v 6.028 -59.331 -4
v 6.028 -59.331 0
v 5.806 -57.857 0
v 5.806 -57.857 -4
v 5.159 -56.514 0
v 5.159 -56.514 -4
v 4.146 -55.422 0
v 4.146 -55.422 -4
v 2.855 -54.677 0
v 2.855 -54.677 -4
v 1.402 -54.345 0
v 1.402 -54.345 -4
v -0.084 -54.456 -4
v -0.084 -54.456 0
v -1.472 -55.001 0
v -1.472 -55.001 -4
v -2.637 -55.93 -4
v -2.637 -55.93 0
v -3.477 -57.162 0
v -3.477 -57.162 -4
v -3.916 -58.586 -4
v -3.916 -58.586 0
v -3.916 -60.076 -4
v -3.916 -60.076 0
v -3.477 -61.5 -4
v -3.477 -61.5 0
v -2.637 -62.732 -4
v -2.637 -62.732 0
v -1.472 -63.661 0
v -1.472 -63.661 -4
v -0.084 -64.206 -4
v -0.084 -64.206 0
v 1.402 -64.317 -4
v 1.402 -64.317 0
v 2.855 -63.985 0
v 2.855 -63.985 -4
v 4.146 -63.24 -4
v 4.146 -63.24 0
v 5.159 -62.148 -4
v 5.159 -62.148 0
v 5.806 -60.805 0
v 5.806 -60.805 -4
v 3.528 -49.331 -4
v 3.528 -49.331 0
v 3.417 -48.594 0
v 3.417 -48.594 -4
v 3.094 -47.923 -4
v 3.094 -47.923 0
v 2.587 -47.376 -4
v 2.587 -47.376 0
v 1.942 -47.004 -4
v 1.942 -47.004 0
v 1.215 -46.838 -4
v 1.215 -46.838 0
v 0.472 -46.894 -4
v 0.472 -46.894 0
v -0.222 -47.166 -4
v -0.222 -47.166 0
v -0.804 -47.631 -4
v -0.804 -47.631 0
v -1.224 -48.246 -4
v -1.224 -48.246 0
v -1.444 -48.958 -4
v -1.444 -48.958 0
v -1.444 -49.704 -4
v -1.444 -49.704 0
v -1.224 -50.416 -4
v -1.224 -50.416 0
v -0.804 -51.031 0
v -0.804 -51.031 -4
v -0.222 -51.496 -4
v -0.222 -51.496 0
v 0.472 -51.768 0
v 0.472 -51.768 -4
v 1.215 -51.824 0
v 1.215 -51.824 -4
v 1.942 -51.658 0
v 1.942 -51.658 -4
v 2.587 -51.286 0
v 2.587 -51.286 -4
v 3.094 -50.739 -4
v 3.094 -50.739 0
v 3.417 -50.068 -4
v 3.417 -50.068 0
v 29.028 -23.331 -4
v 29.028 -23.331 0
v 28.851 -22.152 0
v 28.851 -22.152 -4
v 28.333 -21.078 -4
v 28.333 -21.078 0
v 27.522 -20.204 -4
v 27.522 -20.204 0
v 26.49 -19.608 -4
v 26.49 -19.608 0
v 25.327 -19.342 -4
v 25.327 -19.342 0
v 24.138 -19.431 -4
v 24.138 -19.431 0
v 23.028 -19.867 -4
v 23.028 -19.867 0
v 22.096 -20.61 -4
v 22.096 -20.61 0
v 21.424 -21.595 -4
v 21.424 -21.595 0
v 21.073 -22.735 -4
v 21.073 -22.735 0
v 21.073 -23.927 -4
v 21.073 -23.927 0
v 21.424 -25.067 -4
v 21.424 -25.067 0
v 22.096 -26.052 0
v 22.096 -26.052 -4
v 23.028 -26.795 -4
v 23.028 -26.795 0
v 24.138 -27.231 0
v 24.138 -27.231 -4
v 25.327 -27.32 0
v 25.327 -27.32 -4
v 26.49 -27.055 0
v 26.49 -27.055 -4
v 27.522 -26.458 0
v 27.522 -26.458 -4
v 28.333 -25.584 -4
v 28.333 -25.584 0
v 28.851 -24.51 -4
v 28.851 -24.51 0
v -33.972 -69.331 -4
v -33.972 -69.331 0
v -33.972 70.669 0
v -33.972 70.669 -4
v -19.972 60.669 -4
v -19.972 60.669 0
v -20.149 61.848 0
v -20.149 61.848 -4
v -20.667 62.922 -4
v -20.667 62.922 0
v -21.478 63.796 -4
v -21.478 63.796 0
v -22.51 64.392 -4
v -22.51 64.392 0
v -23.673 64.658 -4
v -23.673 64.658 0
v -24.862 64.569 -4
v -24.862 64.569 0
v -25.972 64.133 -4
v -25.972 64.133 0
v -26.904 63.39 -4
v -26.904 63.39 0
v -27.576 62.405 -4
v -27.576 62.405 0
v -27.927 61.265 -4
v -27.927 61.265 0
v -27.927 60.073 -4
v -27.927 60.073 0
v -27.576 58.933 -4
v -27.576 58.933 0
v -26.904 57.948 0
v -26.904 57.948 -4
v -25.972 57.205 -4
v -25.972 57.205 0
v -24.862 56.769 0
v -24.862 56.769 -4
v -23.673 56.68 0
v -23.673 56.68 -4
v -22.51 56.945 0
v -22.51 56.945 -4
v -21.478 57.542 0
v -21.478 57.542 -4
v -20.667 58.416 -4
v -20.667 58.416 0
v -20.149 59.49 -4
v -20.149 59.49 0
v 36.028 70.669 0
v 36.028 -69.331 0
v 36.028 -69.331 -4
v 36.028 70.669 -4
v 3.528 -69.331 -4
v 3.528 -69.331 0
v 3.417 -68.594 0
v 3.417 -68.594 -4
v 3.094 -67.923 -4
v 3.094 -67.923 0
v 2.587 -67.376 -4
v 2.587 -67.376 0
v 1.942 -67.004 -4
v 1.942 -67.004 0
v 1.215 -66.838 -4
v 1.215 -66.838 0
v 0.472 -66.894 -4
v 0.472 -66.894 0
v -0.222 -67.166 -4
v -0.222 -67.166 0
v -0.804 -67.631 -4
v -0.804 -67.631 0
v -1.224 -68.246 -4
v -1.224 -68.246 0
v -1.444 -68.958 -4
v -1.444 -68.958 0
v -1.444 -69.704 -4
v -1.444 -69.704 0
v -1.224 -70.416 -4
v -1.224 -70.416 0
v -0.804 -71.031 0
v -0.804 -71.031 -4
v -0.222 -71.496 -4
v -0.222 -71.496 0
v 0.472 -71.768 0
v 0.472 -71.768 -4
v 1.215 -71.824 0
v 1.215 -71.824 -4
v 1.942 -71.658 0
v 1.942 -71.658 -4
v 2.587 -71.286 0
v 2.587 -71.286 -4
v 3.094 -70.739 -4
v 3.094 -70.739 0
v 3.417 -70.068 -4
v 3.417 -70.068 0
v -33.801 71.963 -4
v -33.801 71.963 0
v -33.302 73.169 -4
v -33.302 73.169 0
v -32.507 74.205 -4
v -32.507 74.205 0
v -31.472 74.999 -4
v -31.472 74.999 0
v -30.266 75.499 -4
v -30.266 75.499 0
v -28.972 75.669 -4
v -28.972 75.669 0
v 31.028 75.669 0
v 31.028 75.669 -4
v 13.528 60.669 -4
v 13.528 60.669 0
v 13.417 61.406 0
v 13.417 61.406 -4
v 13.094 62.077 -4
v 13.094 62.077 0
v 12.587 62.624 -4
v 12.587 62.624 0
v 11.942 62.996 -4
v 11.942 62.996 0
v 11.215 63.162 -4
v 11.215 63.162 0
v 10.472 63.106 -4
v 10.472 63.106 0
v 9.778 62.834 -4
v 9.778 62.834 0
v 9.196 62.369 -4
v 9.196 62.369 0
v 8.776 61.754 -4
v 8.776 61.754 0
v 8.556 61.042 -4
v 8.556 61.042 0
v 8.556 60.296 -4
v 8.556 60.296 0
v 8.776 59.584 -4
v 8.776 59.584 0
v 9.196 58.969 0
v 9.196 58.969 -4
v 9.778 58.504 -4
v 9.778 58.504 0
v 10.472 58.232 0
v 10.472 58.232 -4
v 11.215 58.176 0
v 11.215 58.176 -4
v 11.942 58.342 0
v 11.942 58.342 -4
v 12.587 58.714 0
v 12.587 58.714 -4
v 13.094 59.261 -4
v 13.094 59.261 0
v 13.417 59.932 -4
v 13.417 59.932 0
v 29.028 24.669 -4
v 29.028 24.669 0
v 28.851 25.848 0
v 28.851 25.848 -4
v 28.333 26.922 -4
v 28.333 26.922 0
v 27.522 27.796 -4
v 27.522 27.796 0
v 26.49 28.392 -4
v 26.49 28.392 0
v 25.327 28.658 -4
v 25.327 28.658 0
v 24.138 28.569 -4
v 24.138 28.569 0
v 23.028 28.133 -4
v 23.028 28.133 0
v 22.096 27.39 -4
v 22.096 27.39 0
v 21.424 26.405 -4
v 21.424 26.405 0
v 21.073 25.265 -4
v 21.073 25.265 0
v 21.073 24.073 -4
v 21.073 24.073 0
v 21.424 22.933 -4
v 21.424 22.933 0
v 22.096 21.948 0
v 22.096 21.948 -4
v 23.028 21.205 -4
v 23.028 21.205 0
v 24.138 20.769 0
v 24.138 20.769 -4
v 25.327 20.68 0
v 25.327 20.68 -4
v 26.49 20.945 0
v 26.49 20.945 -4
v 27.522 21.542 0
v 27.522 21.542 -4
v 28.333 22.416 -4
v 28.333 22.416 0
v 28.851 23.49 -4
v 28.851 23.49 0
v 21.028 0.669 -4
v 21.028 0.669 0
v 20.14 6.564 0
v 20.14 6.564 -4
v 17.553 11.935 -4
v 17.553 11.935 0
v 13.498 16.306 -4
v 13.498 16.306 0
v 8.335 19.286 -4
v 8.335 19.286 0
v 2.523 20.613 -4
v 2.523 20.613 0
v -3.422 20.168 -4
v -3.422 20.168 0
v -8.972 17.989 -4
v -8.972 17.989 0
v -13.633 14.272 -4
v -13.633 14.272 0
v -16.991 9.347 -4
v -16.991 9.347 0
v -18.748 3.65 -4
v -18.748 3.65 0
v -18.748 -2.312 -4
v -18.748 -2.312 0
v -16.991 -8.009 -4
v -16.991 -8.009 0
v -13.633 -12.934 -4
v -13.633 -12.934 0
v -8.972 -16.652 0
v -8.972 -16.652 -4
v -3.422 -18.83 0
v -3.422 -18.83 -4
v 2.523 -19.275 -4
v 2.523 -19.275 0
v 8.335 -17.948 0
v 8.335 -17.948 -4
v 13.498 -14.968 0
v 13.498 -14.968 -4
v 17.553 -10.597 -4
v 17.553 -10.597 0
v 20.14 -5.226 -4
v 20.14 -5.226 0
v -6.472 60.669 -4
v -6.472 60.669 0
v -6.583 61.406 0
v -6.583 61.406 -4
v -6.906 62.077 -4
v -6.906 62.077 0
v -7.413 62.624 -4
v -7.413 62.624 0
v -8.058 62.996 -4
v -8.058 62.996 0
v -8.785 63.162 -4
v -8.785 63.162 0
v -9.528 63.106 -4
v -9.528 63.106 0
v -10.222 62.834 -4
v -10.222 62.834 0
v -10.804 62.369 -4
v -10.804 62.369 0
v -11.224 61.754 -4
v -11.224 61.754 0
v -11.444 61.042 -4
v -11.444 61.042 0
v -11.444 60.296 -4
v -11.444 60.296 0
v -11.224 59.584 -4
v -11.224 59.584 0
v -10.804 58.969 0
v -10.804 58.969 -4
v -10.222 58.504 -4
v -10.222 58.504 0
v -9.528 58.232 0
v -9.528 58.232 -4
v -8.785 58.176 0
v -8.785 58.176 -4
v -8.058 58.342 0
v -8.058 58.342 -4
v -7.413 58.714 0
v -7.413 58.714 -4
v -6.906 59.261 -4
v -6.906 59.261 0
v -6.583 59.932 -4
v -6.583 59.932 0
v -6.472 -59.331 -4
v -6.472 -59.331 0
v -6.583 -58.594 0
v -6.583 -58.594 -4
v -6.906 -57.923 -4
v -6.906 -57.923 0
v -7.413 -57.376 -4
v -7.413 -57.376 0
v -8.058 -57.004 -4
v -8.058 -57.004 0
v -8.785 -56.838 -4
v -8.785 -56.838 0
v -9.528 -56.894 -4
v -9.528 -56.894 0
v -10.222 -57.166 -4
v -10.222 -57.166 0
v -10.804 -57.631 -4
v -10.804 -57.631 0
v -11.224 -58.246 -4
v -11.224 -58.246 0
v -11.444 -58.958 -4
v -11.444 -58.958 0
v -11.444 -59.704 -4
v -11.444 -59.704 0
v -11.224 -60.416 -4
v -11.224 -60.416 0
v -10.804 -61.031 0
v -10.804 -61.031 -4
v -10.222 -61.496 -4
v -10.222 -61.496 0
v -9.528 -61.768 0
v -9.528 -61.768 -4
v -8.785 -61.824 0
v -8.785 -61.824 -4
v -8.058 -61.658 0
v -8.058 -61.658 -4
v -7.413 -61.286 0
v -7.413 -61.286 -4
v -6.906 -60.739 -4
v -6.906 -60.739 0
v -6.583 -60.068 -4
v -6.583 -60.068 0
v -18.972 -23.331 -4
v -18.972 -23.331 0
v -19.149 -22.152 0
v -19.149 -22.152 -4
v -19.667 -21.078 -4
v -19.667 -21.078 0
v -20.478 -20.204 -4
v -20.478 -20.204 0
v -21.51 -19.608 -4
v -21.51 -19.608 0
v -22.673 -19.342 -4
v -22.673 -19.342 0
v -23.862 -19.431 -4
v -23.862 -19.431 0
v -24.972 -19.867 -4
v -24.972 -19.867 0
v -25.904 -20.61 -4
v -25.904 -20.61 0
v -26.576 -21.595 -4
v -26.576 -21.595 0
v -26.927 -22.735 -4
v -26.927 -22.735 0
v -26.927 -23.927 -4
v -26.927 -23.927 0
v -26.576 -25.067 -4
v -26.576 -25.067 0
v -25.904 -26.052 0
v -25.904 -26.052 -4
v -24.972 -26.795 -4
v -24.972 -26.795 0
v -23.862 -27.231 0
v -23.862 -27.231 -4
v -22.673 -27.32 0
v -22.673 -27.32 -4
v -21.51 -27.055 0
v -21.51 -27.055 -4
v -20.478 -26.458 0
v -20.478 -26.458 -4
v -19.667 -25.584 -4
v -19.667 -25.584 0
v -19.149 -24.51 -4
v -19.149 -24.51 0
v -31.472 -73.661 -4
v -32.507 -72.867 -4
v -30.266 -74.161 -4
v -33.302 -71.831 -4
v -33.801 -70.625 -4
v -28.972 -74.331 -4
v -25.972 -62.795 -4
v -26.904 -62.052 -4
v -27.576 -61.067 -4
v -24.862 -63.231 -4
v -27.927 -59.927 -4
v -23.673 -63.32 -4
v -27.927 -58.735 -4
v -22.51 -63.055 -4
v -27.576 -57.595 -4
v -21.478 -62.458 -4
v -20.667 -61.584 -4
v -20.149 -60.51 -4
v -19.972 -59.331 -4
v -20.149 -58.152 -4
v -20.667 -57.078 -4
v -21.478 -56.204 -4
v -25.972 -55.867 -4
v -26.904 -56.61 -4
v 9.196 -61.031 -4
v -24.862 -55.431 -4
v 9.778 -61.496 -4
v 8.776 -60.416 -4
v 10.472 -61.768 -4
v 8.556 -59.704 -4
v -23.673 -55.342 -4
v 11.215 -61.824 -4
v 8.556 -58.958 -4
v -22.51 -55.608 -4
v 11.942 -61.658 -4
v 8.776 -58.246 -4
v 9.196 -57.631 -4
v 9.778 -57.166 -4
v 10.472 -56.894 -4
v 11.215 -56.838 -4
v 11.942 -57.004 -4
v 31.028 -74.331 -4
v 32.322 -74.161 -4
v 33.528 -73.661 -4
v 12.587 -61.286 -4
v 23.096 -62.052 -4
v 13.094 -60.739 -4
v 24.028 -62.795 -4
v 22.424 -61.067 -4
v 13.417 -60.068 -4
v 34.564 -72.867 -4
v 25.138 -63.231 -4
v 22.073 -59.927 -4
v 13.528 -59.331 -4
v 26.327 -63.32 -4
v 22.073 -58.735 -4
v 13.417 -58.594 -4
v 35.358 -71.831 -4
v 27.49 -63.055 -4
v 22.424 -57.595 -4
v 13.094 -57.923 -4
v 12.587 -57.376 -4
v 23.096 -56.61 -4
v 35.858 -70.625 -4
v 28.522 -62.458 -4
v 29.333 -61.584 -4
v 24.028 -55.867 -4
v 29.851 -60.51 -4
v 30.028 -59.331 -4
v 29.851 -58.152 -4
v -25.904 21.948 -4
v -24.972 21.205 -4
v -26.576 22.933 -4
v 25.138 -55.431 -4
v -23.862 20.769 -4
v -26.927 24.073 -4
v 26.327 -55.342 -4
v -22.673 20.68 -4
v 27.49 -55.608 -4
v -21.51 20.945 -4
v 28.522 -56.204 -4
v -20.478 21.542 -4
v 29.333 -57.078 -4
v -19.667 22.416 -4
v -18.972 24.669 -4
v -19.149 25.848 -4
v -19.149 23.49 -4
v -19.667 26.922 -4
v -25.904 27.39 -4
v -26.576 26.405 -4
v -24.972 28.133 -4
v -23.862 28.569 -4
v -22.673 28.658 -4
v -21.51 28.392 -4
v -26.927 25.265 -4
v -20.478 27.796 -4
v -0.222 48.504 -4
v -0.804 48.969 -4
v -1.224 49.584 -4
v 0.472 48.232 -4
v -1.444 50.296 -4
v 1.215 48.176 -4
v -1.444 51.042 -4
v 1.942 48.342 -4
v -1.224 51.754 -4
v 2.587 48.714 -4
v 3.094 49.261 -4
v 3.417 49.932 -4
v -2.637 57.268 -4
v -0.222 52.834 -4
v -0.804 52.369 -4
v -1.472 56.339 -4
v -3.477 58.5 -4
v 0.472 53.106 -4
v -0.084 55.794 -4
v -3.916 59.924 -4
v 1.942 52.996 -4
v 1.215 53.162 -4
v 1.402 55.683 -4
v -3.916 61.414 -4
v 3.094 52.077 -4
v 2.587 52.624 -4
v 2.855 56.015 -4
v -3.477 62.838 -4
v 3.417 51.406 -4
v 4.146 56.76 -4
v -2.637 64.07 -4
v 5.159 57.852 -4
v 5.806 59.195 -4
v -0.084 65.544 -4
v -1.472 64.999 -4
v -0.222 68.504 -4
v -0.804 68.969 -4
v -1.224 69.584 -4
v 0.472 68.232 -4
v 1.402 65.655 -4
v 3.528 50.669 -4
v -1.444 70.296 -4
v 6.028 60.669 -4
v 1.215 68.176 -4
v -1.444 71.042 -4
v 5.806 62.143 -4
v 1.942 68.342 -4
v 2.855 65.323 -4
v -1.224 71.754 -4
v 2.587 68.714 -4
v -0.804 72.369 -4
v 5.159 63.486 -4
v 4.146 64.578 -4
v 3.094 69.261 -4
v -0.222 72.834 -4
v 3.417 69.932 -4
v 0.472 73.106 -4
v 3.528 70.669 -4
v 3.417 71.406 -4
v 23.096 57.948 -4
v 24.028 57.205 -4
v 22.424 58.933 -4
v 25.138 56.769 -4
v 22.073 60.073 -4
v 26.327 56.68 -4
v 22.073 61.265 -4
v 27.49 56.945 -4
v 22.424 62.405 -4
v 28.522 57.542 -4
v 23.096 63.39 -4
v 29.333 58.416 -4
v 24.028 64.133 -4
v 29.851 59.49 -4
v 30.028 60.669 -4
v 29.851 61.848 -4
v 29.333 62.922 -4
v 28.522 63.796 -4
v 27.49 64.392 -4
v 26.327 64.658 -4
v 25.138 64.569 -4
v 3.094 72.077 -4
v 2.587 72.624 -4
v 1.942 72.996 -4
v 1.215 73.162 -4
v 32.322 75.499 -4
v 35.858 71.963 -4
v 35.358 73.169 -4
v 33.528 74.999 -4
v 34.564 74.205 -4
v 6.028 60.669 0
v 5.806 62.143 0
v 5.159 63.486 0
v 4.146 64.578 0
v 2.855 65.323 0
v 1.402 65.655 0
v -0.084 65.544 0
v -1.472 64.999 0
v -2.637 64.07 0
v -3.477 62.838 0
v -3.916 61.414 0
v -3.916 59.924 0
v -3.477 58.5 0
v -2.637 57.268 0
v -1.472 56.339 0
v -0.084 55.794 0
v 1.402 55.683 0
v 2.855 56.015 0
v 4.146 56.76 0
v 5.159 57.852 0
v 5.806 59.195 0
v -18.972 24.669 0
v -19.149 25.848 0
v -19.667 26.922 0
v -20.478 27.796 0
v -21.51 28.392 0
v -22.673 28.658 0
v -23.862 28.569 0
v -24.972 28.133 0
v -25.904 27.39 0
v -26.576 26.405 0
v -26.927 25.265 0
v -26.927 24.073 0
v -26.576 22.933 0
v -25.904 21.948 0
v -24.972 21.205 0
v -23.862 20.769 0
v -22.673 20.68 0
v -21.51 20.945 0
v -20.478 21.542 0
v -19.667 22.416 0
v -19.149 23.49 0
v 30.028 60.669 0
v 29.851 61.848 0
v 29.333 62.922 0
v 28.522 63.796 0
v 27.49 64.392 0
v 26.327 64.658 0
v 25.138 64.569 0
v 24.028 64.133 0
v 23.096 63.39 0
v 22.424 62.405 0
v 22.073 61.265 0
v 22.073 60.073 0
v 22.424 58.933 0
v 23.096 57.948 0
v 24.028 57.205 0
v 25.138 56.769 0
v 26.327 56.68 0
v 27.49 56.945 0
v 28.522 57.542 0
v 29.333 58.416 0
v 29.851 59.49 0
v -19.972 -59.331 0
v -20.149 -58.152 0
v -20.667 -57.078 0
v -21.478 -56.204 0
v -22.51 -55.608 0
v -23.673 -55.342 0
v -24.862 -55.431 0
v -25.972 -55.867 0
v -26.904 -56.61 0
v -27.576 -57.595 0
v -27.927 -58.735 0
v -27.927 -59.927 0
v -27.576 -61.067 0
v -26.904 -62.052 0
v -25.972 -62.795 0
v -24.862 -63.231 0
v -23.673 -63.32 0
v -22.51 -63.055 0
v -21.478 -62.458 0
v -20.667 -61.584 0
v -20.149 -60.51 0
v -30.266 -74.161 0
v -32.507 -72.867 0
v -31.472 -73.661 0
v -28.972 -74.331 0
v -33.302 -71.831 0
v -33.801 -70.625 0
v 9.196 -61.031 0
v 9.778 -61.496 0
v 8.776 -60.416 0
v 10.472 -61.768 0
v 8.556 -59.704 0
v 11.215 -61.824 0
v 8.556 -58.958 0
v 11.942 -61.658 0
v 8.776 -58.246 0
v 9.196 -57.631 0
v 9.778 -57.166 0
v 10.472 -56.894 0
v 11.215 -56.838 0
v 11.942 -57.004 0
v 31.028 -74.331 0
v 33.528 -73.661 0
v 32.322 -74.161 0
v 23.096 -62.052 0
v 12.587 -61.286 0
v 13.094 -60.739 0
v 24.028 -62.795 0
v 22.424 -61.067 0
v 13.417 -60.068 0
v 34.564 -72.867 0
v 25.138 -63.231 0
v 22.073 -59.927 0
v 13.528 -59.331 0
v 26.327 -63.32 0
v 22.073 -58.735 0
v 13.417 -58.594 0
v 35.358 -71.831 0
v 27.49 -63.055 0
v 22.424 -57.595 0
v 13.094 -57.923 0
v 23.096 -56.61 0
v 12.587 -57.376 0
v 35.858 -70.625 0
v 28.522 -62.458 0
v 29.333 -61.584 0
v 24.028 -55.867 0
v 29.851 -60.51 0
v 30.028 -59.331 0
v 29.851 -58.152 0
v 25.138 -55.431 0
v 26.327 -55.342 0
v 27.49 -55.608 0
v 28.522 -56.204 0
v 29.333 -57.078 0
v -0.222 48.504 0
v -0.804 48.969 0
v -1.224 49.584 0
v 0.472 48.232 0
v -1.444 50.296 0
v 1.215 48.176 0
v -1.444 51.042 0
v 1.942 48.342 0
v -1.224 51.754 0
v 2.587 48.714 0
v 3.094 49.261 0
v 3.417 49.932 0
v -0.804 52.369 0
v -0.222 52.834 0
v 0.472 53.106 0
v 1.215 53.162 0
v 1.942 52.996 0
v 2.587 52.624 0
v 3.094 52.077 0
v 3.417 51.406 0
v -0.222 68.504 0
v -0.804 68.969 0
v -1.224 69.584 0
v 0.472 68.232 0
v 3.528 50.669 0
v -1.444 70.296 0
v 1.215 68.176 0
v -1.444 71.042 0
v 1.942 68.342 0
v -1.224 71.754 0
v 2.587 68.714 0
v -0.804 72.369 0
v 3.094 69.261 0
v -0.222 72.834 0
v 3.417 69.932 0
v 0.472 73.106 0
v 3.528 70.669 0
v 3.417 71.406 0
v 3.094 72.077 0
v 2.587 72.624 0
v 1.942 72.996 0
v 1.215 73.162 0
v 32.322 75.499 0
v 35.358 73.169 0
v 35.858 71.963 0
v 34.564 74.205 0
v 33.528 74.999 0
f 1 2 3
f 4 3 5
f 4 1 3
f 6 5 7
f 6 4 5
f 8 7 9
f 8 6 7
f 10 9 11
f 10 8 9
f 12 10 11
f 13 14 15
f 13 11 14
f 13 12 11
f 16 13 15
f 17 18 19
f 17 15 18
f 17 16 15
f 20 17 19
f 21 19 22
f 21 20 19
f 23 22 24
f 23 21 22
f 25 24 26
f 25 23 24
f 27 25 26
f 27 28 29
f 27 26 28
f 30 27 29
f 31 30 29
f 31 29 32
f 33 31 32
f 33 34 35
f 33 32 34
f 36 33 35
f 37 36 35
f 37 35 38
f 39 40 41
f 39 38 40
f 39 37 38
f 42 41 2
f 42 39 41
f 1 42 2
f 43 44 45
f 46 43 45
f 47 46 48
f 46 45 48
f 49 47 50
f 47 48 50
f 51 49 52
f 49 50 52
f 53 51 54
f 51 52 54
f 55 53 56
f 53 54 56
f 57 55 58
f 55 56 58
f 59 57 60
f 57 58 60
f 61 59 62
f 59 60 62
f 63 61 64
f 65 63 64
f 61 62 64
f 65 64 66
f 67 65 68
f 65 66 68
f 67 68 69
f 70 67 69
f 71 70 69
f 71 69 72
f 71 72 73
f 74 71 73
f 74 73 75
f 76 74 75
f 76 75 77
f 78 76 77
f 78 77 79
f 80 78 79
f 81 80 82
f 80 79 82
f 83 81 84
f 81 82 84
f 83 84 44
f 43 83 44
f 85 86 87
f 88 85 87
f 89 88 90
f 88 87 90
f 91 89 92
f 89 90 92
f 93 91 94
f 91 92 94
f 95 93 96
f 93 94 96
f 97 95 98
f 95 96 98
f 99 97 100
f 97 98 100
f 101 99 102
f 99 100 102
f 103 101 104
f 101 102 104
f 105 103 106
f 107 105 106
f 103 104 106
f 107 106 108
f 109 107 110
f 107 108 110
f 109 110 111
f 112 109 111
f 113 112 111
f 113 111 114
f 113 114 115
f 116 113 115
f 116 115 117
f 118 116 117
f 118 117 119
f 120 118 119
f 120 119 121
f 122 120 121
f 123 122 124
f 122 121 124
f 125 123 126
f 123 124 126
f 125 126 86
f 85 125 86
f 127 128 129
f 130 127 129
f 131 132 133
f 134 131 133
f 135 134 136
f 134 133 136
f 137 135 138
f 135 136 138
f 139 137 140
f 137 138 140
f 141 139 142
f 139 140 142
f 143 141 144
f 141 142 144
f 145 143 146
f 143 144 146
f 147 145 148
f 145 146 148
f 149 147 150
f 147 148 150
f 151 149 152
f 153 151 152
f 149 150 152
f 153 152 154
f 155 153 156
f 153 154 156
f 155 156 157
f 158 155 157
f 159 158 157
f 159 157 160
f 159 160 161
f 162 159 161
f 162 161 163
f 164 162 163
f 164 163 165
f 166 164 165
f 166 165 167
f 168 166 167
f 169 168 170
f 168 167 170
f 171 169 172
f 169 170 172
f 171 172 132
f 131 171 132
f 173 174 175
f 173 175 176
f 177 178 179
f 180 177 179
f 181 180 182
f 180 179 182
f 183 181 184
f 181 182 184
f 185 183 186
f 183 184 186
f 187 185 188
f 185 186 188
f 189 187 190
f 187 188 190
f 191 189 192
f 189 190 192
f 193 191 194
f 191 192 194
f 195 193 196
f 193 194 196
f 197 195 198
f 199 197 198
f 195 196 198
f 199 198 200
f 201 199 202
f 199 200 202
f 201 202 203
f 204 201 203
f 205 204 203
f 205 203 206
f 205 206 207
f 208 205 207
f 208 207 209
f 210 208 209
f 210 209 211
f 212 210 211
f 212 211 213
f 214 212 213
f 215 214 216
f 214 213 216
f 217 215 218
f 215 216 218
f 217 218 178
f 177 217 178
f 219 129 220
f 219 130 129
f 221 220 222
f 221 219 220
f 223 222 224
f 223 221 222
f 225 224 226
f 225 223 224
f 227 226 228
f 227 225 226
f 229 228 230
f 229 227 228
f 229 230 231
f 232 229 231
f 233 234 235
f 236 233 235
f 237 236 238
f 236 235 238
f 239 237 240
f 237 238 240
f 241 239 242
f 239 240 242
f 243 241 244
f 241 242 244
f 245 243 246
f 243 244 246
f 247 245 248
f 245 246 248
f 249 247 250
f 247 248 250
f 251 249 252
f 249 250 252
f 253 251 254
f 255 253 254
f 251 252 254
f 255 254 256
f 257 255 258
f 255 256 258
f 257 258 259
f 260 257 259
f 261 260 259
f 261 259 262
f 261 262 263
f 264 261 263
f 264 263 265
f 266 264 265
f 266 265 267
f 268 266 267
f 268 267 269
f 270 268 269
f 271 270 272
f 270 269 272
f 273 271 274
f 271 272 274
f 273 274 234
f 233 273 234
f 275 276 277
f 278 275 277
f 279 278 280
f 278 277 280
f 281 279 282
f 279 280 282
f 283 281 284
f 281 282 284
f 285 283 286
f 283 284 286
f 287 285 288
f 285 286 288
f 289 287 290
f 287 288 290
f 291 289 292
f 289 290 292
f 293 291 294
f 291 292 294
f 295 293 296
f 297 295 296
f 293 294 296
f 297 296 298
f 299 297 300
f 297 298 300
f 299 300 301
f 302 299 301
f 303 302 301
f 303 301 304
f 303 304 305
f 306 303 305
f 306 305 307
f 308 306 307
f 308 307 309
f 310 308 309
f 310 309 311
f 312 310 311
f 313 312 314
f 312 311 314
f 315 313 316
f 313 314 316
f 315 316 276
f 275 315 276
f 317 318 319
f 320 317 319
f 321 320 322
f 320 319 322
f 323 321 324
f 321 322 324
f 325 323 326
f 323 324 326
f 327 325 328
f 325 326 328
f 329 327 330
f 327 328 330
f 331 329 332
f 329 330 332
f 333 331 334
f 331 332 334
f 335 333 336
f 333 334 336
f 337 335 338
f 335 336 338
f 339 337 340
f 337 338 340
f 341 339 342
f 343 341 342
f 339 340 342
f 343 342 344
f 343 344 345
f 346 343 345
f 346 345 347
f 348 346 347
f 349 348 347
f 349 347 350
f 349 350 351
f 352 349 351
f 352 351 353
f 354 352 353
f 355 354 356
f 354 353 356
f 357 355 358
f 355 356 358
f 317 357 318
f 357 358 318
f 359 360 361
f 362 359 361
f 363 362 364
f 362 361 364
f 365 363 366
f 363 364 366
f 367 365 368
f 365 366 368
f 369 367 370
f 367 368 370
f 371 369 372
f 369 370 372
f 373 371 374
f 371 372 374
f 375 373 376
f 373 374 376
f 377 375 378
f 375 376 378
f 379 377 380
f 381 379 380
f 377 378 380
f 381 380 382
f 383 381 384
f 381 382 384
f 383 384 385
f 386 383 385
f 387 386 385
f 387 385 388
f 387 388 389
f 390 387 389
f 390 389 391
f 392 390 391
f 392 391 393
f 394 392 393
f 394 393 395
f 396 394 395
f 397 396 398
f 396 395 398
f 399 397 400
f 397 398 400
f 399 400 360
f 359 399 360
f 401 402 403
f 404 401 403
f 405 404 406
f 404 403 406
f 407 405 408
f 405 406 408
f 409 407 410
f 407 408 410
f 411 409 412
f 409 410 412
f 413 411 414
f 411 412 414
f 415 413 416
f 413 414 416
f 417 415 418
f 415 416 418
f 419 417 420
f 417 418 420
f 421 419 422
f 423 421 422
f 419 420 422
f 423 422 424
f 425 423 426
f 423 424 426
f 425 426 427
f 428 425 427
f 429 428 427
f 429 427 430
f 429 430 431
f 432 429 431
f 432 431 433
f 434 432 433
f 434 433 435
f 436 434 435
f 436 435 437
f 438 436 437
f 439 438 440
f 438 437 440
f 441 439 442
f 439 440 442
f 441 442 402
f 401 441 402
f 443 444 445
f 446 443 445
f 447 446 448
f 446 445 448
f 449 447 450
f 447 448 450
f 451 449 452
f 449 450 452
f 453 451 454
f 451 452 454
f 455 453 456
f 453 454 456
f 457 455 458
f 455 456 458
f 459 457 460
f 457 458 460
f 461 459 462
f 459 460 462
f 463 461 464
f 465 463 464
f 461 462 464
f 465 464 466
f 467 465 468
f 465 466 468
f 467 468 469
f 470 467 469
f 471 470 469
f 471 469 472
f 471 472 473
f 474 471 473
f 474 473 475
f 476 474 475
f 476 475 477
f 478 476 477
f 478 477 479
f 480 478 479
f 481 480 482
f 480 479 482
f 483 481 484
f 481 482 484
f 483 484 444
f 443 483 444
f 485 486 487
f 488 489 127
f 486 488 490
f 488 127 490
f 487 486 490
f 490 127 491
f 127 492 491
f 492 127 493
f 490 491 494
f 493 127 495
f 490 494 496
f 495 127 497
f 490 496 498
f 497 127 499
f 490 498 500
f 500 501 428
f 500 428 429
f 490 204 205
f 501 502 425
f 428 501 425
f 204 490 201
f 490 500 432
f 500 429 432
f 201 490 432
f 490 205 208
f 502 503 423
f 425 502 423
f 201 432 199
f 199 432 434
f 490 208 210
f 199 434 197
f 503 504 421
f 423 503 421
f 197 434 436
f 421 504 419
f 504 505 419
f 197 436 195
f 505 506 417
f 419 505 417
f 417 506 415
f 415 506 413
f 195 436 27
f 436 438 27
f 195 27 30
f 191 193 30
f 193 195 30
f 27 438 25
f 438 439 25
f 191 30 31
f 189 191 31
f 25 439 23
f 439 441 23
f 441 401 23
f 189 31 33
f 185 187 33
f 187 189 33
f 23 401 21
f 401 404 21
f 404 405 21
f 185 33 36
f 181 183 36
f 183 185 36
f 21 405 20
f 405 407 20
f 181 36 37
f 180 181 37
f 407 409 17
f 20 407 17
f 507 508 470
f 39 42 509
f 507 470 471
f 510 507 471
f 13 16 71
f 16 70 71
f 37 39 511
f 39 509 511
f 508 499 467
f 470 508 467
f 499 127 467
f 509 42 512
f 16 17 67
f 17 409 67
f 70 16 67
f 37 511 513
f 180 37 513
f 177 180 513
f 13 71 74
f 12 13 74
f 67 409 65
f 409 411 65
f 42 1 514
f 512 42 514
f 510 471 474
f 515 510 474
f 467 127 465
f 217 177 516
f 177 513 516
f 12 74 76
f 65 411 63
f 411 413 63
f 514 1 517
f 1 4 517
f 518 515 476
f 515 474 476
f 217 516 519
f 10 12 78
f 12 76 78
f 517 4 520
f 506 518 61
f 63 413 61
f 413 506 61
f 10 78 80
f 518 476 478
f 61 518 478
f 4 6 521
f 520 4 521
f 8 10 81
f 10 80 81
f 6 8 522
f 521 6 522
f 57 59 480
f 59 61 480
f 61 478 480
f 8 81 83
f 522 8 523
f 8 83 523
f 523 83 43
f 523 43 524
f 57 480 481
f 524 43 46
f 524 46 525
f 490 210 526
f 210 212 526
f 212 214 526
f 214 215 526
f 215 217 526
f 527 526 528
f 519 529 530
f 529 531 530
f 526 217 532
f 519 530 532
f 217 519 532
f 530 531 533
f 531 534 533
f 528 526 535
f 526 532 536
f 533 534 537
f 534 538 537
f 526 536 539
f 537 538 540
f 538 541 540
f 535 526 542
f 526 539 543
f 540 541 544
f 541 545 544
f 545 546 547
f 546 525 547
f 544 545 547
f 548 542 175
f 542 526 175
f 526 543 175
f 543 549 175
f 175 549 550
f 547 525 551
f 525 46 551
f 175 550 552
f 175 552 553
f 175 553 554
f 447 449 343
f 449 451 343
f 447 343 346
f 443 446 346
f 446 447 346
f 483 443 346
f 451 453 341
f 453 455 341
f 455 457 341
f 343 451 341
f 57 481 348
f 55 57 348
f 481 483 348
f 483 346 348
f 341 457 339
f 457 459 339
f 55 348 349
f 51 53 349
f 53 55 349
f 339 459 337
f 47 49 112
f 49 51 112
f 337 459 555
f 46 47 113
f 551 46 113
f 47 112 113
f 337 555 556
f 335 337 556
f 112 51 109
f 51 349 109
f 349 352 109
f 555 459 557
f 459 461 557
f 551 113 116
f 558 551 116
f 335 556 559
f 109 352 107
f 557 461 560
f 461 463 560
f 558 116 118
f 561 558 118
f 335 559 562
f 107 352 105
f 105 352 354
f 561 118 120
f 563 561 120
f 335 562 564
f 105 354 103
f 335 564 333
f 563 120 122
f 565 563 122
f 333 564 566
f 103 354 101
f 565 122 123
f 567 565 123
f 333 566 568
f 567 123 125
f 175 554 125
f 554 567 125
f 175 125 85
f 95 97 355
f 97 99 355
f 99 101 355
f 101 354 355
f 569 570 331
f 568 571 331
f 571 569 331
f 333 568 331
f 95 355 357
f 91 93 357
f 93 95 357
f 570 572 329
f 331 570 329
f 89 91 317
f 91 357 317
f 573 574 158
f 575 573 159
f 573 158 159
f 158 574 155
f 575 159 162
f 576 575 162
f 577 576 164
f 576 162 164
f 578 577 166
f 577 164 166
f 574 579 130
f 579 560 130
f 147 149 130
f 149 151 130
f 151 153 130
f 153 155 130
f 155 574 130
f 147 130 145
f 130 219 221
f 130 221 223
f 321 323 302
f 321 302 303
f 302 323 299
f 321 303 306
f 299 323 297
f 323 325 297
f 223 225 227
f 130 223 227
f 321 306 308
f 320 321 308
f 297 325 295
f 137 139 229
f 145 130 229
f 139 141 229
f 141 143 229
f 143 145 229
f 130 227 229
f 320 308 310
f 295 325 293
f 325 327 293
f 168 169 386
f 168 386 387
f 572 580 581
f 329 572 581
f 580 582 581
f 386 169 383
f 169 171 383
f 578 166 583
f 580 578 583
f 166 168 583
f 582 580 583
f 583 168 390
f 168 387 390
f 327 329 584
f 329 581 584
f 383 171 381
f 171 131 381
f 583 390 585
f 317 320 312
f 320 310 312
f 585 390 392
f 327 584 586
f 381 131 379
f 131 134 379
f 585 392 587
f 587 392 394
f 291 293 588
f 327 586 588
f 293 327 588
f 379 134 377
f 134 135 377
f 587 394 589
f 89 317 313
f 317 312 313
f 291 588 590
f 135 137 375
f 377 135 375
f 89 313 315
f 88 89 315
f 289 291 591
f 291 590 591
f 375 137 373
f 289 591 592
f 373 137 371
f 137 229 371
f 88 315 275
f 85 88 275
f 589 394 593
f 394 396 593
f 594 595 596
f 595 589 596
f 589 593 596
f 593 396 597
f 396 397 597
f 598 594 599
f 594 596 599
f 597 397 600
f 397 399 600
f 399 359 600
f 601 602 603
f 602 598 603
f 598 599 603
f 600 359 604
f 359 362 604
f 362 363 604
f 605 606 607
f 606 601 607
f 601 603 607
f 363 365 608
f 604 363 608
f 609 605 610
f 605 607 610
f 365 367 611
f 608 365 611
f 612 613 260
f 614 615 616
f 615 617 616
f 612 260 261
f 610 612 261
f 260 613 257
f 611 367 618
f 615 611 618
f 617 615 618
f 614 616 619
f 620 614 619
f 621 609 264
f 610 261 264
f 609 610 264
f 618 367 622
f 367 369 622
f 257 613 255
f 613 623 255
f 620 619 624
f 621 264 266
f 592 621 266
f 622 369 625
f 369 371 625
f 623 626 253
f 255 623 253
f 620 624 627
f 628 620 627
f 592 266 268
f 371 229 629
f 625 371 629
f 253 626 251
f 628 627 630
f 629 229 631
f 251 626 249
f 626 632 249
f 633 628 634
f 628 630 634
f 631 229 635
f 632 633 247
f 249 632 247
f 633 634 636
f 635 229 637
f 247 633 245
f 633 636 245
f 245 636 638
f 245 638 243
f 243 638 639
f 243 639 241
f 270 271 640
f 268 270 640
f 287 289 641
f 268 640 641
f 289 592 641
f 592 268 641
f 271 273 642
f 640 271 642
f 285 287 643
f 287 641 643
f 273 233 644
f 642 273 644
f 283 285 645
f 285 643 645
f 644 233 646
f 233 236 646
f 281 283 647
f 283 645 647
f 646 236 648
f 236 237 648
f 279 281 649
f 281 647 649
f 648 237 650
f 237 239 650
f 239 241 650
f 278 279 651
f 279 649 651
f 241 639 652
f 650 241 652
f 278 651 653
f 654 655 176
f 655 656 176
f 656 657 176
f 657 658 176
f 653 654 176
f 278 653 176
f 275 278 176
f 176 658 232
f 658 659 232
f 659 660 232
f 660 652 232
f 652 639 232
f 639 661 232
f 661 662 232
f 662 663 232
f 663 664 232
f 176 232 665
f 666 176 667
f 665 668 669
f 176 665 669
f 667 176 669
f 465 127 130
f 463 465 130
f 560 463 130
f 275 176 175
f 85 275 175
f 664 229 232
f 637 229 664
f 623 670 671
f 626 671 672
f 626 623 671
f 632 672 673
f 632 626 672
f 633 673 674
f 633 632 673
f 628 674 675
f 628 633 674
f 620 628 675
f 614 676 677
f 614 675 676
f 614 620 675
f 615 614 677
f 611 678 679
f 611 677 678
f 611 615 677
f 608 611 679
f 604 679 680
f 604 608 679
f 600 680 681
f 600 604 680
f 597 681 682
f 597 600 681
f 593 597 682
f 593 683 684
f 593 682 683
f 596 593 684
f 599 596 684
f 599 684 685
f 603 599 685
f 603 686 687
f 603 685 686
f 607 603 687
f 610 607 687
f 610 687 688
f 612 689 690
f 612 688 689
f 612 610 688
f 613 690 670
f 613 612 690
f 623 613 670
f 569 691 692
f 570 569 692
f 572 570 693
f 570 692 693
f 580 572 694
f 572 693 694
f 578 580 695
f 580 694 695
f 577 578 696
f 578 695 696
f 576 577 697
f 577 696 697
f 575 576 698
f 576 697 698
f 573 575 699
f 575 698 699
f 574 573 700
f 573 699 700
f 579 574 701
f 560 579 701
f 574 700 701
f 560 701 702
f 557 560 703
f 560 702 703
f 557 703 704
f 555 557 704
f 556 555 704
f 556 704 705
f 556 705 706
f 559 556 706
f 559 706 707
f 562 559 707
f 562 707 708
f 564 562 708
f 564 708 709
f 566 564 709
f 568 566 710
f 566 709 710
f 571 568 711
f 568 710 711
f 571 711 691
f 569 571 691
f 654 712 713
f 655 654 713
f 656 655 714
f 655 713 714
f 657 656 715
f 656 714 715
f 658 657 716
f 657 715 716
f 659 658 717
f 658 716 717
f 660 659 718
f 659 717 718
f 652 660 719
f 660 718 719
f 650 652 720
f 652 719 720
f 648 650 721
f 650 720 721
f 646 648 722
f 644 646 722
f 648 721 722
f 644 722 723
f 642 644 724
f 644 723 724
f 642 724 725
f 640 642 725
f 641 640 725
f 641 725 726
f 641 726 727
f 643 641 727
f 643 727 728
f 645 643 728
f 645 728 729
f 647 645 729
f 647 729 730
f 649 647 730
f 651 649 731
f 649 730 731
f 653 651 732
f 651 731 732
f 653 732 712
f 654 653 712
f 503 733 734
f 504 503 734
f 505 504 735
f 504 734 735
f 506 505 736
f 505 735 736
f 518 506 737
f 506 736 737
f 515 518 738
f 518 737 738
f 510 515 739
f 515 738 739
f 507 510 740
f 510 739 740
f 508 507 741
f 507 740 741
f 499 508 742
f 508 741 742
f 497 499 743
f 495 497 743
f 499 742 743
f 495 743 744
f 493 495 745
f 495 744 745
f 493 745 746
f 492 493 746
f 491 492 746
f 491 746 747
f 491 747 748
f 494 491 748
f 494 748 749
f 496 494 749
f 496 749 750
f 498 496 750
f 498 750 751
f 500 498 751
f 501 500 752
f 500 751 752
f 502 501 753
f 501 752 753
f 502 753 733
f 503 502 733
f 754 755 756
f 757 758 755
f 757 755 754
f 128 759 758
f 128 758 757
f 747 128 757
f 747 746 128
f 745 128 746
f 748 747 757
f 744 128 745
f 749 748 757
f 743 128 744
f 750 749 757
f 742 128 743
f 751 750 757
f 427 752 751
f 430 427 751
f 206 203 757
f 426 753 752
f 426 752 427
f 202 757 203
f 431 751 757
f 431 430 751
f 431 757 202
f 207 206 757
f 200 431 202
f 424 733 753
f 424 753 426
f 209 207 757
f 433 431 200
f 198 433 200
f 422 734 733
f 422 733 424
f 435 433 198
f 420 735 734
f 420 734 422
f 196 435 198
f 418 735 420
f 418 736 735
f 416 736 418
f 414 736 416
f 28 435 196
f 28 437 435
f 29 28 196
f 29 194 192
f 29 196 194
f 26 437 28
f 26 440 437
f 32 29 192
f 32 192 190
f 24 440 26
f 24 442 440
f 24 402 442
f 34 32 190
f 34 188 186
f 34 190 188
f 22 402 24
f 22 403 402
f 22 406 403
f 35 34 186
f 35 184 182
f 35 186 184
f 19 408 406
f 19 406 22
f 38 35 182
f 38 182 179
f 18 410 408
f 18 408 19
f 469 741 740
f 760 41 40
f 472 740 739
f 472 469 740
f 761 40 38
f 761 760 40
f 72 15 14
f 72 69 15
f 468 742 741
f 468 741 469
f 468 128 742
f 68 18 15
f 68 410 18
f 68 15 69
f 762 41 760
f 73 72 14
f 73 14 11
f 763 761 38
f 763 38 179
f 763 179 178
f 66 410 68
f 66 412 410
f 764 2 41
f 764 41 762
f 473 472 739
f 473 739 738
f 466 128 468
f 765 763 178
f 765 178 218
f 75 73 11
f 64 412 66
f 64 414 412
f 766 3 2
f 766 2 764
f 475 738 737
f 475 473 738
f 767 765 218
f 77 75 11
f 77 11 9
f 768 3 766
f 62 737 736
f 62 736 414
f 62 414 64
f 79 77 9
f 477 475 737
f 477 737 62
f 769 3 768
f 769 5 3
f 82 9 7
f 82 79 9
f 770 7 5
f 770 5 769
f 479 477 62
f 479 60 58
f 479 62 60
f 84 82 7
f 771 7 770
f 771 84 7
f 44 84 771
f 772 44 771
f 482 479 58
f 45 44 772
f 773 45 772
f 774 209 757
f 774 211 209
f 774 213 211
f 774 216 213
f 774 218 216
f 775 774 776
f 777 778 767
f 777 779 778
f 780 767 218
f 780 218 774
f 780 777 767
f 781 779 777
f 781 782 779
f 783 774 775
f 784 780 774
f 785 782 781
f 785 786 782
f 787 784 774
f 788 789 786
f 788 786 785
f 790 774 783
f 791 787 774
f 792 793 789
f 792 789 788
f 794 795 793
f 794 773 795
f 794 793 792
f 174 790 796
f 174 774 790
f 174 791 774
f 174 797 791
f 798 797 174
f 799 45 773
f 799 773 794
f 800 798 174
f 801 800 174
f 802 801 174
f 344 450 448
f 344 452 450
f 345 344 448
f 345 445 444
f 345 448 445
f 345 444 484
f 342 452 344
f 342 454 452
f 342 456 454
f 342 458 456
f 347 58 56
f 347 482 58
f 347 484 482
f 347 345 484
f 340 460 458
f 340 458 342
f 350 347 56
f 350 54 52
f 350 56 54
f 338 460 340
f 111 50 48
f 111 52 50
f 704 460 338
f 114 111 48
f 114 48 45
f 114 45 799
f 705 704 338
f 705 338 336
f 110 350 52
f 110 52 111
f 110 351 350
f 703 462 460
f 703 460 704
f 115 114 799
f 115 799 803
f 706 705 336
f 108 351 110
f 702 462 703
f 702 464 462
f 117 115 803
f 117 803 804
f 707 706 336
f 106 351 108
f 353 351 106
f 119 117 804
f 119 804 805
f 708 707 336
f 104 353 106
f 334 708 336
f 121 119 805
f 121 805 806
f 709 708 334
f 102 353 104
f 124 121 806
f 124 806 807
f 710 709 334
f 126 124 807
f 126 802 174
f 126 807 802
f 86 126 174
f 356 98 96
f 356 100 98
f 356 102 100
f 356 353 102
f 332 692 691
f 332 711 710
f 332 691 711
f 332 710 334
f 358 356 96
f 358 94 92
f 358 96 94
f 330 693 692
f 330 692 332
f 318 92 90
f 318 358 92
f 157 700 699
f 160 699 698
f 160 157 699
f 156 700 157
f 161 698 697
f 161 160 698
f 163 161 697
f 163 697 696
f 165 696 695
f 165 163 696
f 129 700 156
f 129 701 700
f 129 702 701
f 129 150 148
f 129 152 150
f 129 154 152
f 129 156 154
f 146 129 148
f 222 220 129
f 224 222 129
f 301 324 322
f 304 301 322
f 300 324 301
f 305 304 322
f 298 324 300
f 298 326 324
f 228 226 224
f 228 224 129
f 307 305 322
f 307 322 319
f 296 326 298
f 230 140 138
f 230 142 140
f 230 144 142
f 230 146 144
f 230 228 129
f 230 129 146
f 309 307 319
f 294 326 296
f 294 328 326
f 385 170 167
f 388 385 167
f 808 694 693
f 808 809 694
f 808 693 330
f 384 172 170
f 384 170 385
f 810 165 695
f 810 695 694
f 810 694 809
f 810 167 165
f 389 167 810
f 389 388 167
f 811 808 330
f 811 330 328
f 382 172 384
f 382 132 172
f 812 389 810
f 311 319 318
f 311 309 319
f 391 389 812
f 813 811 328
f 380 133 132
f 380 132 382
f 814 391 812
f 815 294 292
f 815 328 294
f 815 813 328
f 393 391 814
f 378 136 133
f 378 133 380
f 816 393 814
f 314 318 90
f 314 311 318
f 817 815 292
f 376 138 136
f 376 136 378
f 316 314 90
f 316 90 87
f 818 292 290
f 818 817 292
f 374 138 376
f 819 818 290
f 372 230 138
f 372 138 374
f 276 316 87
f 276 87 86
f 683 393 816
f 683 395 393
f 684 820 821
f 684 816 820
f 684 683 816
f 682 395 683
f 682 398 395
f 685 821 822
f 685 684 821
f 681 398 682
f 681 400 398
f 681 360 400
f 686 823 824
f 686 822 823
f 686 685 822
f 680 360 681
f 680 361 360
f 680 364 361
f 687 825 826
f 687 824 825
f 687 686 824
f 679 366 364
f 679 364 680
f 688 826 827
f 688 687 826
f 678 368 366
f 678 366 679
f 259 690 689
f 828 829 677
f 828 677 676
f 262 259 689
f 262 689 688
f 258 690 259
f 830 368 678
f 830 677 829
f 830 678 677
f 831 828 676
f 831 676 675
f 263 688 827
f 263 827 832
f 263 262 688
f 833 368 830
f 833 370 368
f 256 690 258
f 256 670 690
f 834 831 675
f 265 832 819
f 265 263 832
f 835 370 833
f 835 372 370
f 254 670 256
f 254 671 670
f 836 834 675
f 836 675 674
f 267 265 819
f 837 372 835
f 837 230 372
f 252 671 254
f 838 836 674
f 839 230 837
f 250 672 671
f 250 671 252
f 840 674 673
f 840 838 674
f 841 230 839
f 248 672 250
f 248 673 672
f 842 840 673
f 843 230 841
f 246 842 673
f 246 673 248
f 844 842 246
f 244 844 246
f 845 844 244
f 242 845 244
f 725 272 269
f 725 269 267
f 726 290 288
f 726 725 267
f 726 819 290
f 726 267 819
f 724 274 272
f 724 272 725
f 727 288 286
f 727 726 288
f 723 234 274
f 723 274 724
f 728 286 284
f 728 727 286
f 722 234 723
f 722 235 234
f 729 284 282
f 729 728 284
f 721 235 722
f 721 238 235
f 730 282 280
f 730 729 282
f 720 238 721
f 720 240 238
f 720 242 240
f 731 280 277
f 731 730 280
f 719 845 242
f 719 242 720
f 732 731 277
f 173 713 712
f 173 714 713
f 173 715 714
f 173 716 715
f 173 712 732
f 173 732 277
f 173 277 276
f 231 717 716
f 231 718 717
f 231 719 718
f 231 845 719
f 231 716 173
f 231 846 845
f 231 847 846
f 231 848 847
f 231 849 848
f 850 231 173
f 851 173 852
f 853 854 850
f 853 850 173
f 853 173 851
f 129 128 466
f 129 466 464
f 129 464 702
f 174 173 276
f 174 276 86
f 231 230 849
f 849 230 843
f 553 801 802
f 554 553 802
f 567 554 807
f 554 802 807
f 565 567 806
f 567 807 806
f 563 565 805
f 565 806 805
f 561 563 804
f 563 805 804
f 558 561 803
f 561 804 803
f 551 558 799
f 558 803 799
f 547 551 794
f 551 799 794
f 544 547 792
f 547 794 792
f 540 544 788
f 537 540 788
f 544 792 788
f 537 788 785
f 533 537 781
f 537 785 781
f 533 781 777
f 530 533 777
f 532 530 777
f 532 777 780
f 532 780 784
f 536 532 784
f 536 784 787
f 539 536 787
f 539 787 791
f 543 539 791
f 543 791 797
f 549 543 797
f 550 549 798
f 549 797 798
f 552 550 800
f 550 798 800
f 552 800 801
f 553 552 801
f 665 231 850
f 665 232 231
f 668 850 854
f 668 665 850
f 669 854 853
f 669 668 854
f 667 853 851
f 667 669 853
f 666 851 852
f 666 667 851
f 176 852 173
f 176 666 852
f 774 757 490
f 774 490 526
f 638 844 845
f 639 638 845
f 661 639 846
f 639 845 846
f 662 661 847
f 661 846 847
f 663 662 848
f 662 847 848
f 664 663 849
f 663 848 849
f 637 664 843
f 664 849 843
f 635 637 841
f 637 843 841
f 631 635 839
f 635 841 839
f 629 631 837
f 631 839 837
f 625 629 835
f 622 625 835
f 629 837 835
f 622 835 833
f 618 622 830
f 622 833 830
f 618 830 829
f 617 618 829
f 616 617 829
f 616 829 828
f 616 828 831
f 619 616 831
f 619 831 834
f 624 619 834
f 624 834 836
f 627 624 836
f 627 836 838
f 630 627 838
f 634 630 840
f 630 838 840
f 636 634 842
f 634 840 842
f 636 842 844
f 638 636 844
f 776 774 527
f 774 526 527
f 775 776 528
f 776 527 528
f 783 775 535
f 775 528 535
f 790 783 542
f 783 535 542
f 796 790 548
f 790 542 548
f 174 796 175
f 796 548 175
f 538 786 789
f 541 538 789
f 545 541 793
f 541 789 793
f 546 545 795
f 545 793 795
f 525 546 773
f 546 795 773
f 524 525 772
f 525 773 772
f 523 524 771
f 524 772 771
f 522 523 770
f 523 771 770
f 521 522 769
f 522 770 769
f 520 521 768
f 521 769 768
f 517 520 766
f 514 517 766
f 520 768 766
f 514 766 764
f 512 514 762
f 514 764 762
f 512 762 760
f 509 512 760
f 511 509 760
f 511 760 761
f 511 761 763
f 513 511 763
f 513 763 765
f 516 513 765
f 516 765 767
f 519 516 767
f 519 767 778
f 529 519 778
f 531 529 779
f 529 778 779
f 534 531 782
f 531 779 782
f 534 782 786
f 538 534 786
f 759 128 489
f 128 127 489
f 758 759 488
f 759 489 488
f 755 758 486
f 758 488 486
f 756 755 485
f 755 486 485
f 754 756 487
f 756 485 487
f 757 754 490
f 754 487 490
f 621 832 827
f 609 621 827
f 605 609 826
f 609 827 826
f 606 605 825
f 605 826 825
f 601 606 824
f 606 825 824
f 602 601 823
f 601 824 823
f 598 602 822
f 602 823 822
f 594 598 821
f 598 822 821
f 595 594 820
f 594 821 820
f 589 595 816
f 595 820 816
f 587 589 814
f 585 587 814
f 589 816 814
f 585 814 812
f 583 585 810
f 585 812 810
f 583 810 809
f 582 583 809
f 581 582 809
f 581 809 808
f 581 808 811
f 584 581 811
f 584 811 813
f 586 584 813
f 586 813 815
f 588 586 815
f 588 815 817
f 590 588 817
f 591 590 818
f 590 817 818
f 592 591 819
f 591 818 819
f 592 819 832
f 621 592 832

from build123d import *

# Parameters (mm, degrees)
SKETCH1_W               = 70
SKETCH1_H               = 150
SKETCH1_R               = 20
SKETCH1_R_2             = 4
BASE_FLANGE1_DEPTH      = 4
FILLET1_R               = 5
CUT_EXTRUDE1_DEPTH      = 84.903688401
CUT_EXTRUDE1_DEPTH_BACK = 4
SKETCH2_R               = 5
SKETCH3_R               = 2.5
CUT_EXTRUDE2_DEPTH      = 4


# Sheet-metal steps are written as plain solids
with BuildPart() as part:
    # Sketch1 → Base-Flange1 (new body)
    with BuildSketch(Plane.XY):
        with Locations((1.028252341, 0.668976209)):
            Rectangle(SKETCH1_W, SKETCH1_H)
        with Locations((1.028252341, 0.668976209)):
            Circle(SKETCH1_R, mode=Mode.SUBTRACT)
        with Locations((-22.971747659, 24.668976209)):
            Circle(SKETCH1_R_2, mode=Mode.SUBTRACT)
        with Locations((25.028252341, 24.668976209)):
            Circle(SKETCH1_R_2, mode=Mode.SUBTRACT)
        with Locations((25.028252341, -23.331023791)):
            Circle(SKETCH1_R_2, mode=Mode.SUBTRACT)
        with Locations((-22.971747659, -23.331023791)):
            Circle(SKETCH1_R_2, mode=Mode.SUBTRACT)
        with Locations((26.028252341, 60.668976209)):
            Circle(SKETCH1_R_2, mode=Mode.SUBTRACT)
        with Locations((-23.971747659, 60.668976209)):
            Circle(SKETCH1_R_2, mode=Mode.SUBTRACT)
        with Locations((26.028252341, -59.331023791)):
            Circle(SKETCH1_R_2, mode=Mode.SUBTRACT)
        with Locations((-23.971747659, -59.331023791)):
            Circle(SKETCH1_R_2, mode=Mode.SUBTRACT)
    extrude(amount=-BASE_FLANGE1_DEPTH)

    # Fillet1
    fillet1_edges = [part.edges().sort_by_distance(p)[0] for p in [
        (-33.971747659, 75.668976209, -2),
        (36.028252341, 75.668976209, -2),
        (36.028252341, -74.331023791, -2),
        (-33.971747659, -74.331023791, -2),
    ]]
    fillet(fillet1_edges, radius=FILLET1_R)

    # Sketch2 → Cut-Extrude1 (cut, two sides: drawn at the far end of the back side and taken through both)
    with BuildSketch(Plane.XY.offset(-CUT_EXTRUDE1_DEPTH_BACK)):
        with Locations((1.028252341, 60.668976209)):
            Circle(SKETCH2_R)
        with Locations((1.028252341, -59.331023791)):
            Circle(SKETCH2_R)
    extrude(amount=CUT_EXTRUDE1_DEPTH + CUT_EXTRUDE1_DEPTH_BACK, mode=Mode.SUBTRACT)

    # Sketch3 → Cut-Extrude2 (cut)
    with BuildSketch(Plane.XY):
        with Locations((1.028252341, 70.668976209)):
            Circle(SKETCH3_R)
        with Locations((11.028252341, 60.668976209)):
            Circle(SKETCH3_R)
        with Locations((1.028252341, 50.668976209)):
            Circle(SKETCH3_R)
        with Locations((-8.971747659, 60.668976209)):
            Circle(SKETCH3_R)
        with Locations((-8.971747659, -59.331023791)):
            Circle(SKETCH3_R)
        with Locations((1.028252341, -49.331023791)):
            Circle(SKETCH3_R)
        with Locations((11.028252341, -59.331023791)):
            Circle(SKETCH3_R)
        with Locations((1.028252341, -69.331023791)):
            Circle(SKETCH3_R)
    extrude(amount=-CUT_EXTRUDE2_DEPTH, mode=Mode.SUBTRACT)


solid = part.part
